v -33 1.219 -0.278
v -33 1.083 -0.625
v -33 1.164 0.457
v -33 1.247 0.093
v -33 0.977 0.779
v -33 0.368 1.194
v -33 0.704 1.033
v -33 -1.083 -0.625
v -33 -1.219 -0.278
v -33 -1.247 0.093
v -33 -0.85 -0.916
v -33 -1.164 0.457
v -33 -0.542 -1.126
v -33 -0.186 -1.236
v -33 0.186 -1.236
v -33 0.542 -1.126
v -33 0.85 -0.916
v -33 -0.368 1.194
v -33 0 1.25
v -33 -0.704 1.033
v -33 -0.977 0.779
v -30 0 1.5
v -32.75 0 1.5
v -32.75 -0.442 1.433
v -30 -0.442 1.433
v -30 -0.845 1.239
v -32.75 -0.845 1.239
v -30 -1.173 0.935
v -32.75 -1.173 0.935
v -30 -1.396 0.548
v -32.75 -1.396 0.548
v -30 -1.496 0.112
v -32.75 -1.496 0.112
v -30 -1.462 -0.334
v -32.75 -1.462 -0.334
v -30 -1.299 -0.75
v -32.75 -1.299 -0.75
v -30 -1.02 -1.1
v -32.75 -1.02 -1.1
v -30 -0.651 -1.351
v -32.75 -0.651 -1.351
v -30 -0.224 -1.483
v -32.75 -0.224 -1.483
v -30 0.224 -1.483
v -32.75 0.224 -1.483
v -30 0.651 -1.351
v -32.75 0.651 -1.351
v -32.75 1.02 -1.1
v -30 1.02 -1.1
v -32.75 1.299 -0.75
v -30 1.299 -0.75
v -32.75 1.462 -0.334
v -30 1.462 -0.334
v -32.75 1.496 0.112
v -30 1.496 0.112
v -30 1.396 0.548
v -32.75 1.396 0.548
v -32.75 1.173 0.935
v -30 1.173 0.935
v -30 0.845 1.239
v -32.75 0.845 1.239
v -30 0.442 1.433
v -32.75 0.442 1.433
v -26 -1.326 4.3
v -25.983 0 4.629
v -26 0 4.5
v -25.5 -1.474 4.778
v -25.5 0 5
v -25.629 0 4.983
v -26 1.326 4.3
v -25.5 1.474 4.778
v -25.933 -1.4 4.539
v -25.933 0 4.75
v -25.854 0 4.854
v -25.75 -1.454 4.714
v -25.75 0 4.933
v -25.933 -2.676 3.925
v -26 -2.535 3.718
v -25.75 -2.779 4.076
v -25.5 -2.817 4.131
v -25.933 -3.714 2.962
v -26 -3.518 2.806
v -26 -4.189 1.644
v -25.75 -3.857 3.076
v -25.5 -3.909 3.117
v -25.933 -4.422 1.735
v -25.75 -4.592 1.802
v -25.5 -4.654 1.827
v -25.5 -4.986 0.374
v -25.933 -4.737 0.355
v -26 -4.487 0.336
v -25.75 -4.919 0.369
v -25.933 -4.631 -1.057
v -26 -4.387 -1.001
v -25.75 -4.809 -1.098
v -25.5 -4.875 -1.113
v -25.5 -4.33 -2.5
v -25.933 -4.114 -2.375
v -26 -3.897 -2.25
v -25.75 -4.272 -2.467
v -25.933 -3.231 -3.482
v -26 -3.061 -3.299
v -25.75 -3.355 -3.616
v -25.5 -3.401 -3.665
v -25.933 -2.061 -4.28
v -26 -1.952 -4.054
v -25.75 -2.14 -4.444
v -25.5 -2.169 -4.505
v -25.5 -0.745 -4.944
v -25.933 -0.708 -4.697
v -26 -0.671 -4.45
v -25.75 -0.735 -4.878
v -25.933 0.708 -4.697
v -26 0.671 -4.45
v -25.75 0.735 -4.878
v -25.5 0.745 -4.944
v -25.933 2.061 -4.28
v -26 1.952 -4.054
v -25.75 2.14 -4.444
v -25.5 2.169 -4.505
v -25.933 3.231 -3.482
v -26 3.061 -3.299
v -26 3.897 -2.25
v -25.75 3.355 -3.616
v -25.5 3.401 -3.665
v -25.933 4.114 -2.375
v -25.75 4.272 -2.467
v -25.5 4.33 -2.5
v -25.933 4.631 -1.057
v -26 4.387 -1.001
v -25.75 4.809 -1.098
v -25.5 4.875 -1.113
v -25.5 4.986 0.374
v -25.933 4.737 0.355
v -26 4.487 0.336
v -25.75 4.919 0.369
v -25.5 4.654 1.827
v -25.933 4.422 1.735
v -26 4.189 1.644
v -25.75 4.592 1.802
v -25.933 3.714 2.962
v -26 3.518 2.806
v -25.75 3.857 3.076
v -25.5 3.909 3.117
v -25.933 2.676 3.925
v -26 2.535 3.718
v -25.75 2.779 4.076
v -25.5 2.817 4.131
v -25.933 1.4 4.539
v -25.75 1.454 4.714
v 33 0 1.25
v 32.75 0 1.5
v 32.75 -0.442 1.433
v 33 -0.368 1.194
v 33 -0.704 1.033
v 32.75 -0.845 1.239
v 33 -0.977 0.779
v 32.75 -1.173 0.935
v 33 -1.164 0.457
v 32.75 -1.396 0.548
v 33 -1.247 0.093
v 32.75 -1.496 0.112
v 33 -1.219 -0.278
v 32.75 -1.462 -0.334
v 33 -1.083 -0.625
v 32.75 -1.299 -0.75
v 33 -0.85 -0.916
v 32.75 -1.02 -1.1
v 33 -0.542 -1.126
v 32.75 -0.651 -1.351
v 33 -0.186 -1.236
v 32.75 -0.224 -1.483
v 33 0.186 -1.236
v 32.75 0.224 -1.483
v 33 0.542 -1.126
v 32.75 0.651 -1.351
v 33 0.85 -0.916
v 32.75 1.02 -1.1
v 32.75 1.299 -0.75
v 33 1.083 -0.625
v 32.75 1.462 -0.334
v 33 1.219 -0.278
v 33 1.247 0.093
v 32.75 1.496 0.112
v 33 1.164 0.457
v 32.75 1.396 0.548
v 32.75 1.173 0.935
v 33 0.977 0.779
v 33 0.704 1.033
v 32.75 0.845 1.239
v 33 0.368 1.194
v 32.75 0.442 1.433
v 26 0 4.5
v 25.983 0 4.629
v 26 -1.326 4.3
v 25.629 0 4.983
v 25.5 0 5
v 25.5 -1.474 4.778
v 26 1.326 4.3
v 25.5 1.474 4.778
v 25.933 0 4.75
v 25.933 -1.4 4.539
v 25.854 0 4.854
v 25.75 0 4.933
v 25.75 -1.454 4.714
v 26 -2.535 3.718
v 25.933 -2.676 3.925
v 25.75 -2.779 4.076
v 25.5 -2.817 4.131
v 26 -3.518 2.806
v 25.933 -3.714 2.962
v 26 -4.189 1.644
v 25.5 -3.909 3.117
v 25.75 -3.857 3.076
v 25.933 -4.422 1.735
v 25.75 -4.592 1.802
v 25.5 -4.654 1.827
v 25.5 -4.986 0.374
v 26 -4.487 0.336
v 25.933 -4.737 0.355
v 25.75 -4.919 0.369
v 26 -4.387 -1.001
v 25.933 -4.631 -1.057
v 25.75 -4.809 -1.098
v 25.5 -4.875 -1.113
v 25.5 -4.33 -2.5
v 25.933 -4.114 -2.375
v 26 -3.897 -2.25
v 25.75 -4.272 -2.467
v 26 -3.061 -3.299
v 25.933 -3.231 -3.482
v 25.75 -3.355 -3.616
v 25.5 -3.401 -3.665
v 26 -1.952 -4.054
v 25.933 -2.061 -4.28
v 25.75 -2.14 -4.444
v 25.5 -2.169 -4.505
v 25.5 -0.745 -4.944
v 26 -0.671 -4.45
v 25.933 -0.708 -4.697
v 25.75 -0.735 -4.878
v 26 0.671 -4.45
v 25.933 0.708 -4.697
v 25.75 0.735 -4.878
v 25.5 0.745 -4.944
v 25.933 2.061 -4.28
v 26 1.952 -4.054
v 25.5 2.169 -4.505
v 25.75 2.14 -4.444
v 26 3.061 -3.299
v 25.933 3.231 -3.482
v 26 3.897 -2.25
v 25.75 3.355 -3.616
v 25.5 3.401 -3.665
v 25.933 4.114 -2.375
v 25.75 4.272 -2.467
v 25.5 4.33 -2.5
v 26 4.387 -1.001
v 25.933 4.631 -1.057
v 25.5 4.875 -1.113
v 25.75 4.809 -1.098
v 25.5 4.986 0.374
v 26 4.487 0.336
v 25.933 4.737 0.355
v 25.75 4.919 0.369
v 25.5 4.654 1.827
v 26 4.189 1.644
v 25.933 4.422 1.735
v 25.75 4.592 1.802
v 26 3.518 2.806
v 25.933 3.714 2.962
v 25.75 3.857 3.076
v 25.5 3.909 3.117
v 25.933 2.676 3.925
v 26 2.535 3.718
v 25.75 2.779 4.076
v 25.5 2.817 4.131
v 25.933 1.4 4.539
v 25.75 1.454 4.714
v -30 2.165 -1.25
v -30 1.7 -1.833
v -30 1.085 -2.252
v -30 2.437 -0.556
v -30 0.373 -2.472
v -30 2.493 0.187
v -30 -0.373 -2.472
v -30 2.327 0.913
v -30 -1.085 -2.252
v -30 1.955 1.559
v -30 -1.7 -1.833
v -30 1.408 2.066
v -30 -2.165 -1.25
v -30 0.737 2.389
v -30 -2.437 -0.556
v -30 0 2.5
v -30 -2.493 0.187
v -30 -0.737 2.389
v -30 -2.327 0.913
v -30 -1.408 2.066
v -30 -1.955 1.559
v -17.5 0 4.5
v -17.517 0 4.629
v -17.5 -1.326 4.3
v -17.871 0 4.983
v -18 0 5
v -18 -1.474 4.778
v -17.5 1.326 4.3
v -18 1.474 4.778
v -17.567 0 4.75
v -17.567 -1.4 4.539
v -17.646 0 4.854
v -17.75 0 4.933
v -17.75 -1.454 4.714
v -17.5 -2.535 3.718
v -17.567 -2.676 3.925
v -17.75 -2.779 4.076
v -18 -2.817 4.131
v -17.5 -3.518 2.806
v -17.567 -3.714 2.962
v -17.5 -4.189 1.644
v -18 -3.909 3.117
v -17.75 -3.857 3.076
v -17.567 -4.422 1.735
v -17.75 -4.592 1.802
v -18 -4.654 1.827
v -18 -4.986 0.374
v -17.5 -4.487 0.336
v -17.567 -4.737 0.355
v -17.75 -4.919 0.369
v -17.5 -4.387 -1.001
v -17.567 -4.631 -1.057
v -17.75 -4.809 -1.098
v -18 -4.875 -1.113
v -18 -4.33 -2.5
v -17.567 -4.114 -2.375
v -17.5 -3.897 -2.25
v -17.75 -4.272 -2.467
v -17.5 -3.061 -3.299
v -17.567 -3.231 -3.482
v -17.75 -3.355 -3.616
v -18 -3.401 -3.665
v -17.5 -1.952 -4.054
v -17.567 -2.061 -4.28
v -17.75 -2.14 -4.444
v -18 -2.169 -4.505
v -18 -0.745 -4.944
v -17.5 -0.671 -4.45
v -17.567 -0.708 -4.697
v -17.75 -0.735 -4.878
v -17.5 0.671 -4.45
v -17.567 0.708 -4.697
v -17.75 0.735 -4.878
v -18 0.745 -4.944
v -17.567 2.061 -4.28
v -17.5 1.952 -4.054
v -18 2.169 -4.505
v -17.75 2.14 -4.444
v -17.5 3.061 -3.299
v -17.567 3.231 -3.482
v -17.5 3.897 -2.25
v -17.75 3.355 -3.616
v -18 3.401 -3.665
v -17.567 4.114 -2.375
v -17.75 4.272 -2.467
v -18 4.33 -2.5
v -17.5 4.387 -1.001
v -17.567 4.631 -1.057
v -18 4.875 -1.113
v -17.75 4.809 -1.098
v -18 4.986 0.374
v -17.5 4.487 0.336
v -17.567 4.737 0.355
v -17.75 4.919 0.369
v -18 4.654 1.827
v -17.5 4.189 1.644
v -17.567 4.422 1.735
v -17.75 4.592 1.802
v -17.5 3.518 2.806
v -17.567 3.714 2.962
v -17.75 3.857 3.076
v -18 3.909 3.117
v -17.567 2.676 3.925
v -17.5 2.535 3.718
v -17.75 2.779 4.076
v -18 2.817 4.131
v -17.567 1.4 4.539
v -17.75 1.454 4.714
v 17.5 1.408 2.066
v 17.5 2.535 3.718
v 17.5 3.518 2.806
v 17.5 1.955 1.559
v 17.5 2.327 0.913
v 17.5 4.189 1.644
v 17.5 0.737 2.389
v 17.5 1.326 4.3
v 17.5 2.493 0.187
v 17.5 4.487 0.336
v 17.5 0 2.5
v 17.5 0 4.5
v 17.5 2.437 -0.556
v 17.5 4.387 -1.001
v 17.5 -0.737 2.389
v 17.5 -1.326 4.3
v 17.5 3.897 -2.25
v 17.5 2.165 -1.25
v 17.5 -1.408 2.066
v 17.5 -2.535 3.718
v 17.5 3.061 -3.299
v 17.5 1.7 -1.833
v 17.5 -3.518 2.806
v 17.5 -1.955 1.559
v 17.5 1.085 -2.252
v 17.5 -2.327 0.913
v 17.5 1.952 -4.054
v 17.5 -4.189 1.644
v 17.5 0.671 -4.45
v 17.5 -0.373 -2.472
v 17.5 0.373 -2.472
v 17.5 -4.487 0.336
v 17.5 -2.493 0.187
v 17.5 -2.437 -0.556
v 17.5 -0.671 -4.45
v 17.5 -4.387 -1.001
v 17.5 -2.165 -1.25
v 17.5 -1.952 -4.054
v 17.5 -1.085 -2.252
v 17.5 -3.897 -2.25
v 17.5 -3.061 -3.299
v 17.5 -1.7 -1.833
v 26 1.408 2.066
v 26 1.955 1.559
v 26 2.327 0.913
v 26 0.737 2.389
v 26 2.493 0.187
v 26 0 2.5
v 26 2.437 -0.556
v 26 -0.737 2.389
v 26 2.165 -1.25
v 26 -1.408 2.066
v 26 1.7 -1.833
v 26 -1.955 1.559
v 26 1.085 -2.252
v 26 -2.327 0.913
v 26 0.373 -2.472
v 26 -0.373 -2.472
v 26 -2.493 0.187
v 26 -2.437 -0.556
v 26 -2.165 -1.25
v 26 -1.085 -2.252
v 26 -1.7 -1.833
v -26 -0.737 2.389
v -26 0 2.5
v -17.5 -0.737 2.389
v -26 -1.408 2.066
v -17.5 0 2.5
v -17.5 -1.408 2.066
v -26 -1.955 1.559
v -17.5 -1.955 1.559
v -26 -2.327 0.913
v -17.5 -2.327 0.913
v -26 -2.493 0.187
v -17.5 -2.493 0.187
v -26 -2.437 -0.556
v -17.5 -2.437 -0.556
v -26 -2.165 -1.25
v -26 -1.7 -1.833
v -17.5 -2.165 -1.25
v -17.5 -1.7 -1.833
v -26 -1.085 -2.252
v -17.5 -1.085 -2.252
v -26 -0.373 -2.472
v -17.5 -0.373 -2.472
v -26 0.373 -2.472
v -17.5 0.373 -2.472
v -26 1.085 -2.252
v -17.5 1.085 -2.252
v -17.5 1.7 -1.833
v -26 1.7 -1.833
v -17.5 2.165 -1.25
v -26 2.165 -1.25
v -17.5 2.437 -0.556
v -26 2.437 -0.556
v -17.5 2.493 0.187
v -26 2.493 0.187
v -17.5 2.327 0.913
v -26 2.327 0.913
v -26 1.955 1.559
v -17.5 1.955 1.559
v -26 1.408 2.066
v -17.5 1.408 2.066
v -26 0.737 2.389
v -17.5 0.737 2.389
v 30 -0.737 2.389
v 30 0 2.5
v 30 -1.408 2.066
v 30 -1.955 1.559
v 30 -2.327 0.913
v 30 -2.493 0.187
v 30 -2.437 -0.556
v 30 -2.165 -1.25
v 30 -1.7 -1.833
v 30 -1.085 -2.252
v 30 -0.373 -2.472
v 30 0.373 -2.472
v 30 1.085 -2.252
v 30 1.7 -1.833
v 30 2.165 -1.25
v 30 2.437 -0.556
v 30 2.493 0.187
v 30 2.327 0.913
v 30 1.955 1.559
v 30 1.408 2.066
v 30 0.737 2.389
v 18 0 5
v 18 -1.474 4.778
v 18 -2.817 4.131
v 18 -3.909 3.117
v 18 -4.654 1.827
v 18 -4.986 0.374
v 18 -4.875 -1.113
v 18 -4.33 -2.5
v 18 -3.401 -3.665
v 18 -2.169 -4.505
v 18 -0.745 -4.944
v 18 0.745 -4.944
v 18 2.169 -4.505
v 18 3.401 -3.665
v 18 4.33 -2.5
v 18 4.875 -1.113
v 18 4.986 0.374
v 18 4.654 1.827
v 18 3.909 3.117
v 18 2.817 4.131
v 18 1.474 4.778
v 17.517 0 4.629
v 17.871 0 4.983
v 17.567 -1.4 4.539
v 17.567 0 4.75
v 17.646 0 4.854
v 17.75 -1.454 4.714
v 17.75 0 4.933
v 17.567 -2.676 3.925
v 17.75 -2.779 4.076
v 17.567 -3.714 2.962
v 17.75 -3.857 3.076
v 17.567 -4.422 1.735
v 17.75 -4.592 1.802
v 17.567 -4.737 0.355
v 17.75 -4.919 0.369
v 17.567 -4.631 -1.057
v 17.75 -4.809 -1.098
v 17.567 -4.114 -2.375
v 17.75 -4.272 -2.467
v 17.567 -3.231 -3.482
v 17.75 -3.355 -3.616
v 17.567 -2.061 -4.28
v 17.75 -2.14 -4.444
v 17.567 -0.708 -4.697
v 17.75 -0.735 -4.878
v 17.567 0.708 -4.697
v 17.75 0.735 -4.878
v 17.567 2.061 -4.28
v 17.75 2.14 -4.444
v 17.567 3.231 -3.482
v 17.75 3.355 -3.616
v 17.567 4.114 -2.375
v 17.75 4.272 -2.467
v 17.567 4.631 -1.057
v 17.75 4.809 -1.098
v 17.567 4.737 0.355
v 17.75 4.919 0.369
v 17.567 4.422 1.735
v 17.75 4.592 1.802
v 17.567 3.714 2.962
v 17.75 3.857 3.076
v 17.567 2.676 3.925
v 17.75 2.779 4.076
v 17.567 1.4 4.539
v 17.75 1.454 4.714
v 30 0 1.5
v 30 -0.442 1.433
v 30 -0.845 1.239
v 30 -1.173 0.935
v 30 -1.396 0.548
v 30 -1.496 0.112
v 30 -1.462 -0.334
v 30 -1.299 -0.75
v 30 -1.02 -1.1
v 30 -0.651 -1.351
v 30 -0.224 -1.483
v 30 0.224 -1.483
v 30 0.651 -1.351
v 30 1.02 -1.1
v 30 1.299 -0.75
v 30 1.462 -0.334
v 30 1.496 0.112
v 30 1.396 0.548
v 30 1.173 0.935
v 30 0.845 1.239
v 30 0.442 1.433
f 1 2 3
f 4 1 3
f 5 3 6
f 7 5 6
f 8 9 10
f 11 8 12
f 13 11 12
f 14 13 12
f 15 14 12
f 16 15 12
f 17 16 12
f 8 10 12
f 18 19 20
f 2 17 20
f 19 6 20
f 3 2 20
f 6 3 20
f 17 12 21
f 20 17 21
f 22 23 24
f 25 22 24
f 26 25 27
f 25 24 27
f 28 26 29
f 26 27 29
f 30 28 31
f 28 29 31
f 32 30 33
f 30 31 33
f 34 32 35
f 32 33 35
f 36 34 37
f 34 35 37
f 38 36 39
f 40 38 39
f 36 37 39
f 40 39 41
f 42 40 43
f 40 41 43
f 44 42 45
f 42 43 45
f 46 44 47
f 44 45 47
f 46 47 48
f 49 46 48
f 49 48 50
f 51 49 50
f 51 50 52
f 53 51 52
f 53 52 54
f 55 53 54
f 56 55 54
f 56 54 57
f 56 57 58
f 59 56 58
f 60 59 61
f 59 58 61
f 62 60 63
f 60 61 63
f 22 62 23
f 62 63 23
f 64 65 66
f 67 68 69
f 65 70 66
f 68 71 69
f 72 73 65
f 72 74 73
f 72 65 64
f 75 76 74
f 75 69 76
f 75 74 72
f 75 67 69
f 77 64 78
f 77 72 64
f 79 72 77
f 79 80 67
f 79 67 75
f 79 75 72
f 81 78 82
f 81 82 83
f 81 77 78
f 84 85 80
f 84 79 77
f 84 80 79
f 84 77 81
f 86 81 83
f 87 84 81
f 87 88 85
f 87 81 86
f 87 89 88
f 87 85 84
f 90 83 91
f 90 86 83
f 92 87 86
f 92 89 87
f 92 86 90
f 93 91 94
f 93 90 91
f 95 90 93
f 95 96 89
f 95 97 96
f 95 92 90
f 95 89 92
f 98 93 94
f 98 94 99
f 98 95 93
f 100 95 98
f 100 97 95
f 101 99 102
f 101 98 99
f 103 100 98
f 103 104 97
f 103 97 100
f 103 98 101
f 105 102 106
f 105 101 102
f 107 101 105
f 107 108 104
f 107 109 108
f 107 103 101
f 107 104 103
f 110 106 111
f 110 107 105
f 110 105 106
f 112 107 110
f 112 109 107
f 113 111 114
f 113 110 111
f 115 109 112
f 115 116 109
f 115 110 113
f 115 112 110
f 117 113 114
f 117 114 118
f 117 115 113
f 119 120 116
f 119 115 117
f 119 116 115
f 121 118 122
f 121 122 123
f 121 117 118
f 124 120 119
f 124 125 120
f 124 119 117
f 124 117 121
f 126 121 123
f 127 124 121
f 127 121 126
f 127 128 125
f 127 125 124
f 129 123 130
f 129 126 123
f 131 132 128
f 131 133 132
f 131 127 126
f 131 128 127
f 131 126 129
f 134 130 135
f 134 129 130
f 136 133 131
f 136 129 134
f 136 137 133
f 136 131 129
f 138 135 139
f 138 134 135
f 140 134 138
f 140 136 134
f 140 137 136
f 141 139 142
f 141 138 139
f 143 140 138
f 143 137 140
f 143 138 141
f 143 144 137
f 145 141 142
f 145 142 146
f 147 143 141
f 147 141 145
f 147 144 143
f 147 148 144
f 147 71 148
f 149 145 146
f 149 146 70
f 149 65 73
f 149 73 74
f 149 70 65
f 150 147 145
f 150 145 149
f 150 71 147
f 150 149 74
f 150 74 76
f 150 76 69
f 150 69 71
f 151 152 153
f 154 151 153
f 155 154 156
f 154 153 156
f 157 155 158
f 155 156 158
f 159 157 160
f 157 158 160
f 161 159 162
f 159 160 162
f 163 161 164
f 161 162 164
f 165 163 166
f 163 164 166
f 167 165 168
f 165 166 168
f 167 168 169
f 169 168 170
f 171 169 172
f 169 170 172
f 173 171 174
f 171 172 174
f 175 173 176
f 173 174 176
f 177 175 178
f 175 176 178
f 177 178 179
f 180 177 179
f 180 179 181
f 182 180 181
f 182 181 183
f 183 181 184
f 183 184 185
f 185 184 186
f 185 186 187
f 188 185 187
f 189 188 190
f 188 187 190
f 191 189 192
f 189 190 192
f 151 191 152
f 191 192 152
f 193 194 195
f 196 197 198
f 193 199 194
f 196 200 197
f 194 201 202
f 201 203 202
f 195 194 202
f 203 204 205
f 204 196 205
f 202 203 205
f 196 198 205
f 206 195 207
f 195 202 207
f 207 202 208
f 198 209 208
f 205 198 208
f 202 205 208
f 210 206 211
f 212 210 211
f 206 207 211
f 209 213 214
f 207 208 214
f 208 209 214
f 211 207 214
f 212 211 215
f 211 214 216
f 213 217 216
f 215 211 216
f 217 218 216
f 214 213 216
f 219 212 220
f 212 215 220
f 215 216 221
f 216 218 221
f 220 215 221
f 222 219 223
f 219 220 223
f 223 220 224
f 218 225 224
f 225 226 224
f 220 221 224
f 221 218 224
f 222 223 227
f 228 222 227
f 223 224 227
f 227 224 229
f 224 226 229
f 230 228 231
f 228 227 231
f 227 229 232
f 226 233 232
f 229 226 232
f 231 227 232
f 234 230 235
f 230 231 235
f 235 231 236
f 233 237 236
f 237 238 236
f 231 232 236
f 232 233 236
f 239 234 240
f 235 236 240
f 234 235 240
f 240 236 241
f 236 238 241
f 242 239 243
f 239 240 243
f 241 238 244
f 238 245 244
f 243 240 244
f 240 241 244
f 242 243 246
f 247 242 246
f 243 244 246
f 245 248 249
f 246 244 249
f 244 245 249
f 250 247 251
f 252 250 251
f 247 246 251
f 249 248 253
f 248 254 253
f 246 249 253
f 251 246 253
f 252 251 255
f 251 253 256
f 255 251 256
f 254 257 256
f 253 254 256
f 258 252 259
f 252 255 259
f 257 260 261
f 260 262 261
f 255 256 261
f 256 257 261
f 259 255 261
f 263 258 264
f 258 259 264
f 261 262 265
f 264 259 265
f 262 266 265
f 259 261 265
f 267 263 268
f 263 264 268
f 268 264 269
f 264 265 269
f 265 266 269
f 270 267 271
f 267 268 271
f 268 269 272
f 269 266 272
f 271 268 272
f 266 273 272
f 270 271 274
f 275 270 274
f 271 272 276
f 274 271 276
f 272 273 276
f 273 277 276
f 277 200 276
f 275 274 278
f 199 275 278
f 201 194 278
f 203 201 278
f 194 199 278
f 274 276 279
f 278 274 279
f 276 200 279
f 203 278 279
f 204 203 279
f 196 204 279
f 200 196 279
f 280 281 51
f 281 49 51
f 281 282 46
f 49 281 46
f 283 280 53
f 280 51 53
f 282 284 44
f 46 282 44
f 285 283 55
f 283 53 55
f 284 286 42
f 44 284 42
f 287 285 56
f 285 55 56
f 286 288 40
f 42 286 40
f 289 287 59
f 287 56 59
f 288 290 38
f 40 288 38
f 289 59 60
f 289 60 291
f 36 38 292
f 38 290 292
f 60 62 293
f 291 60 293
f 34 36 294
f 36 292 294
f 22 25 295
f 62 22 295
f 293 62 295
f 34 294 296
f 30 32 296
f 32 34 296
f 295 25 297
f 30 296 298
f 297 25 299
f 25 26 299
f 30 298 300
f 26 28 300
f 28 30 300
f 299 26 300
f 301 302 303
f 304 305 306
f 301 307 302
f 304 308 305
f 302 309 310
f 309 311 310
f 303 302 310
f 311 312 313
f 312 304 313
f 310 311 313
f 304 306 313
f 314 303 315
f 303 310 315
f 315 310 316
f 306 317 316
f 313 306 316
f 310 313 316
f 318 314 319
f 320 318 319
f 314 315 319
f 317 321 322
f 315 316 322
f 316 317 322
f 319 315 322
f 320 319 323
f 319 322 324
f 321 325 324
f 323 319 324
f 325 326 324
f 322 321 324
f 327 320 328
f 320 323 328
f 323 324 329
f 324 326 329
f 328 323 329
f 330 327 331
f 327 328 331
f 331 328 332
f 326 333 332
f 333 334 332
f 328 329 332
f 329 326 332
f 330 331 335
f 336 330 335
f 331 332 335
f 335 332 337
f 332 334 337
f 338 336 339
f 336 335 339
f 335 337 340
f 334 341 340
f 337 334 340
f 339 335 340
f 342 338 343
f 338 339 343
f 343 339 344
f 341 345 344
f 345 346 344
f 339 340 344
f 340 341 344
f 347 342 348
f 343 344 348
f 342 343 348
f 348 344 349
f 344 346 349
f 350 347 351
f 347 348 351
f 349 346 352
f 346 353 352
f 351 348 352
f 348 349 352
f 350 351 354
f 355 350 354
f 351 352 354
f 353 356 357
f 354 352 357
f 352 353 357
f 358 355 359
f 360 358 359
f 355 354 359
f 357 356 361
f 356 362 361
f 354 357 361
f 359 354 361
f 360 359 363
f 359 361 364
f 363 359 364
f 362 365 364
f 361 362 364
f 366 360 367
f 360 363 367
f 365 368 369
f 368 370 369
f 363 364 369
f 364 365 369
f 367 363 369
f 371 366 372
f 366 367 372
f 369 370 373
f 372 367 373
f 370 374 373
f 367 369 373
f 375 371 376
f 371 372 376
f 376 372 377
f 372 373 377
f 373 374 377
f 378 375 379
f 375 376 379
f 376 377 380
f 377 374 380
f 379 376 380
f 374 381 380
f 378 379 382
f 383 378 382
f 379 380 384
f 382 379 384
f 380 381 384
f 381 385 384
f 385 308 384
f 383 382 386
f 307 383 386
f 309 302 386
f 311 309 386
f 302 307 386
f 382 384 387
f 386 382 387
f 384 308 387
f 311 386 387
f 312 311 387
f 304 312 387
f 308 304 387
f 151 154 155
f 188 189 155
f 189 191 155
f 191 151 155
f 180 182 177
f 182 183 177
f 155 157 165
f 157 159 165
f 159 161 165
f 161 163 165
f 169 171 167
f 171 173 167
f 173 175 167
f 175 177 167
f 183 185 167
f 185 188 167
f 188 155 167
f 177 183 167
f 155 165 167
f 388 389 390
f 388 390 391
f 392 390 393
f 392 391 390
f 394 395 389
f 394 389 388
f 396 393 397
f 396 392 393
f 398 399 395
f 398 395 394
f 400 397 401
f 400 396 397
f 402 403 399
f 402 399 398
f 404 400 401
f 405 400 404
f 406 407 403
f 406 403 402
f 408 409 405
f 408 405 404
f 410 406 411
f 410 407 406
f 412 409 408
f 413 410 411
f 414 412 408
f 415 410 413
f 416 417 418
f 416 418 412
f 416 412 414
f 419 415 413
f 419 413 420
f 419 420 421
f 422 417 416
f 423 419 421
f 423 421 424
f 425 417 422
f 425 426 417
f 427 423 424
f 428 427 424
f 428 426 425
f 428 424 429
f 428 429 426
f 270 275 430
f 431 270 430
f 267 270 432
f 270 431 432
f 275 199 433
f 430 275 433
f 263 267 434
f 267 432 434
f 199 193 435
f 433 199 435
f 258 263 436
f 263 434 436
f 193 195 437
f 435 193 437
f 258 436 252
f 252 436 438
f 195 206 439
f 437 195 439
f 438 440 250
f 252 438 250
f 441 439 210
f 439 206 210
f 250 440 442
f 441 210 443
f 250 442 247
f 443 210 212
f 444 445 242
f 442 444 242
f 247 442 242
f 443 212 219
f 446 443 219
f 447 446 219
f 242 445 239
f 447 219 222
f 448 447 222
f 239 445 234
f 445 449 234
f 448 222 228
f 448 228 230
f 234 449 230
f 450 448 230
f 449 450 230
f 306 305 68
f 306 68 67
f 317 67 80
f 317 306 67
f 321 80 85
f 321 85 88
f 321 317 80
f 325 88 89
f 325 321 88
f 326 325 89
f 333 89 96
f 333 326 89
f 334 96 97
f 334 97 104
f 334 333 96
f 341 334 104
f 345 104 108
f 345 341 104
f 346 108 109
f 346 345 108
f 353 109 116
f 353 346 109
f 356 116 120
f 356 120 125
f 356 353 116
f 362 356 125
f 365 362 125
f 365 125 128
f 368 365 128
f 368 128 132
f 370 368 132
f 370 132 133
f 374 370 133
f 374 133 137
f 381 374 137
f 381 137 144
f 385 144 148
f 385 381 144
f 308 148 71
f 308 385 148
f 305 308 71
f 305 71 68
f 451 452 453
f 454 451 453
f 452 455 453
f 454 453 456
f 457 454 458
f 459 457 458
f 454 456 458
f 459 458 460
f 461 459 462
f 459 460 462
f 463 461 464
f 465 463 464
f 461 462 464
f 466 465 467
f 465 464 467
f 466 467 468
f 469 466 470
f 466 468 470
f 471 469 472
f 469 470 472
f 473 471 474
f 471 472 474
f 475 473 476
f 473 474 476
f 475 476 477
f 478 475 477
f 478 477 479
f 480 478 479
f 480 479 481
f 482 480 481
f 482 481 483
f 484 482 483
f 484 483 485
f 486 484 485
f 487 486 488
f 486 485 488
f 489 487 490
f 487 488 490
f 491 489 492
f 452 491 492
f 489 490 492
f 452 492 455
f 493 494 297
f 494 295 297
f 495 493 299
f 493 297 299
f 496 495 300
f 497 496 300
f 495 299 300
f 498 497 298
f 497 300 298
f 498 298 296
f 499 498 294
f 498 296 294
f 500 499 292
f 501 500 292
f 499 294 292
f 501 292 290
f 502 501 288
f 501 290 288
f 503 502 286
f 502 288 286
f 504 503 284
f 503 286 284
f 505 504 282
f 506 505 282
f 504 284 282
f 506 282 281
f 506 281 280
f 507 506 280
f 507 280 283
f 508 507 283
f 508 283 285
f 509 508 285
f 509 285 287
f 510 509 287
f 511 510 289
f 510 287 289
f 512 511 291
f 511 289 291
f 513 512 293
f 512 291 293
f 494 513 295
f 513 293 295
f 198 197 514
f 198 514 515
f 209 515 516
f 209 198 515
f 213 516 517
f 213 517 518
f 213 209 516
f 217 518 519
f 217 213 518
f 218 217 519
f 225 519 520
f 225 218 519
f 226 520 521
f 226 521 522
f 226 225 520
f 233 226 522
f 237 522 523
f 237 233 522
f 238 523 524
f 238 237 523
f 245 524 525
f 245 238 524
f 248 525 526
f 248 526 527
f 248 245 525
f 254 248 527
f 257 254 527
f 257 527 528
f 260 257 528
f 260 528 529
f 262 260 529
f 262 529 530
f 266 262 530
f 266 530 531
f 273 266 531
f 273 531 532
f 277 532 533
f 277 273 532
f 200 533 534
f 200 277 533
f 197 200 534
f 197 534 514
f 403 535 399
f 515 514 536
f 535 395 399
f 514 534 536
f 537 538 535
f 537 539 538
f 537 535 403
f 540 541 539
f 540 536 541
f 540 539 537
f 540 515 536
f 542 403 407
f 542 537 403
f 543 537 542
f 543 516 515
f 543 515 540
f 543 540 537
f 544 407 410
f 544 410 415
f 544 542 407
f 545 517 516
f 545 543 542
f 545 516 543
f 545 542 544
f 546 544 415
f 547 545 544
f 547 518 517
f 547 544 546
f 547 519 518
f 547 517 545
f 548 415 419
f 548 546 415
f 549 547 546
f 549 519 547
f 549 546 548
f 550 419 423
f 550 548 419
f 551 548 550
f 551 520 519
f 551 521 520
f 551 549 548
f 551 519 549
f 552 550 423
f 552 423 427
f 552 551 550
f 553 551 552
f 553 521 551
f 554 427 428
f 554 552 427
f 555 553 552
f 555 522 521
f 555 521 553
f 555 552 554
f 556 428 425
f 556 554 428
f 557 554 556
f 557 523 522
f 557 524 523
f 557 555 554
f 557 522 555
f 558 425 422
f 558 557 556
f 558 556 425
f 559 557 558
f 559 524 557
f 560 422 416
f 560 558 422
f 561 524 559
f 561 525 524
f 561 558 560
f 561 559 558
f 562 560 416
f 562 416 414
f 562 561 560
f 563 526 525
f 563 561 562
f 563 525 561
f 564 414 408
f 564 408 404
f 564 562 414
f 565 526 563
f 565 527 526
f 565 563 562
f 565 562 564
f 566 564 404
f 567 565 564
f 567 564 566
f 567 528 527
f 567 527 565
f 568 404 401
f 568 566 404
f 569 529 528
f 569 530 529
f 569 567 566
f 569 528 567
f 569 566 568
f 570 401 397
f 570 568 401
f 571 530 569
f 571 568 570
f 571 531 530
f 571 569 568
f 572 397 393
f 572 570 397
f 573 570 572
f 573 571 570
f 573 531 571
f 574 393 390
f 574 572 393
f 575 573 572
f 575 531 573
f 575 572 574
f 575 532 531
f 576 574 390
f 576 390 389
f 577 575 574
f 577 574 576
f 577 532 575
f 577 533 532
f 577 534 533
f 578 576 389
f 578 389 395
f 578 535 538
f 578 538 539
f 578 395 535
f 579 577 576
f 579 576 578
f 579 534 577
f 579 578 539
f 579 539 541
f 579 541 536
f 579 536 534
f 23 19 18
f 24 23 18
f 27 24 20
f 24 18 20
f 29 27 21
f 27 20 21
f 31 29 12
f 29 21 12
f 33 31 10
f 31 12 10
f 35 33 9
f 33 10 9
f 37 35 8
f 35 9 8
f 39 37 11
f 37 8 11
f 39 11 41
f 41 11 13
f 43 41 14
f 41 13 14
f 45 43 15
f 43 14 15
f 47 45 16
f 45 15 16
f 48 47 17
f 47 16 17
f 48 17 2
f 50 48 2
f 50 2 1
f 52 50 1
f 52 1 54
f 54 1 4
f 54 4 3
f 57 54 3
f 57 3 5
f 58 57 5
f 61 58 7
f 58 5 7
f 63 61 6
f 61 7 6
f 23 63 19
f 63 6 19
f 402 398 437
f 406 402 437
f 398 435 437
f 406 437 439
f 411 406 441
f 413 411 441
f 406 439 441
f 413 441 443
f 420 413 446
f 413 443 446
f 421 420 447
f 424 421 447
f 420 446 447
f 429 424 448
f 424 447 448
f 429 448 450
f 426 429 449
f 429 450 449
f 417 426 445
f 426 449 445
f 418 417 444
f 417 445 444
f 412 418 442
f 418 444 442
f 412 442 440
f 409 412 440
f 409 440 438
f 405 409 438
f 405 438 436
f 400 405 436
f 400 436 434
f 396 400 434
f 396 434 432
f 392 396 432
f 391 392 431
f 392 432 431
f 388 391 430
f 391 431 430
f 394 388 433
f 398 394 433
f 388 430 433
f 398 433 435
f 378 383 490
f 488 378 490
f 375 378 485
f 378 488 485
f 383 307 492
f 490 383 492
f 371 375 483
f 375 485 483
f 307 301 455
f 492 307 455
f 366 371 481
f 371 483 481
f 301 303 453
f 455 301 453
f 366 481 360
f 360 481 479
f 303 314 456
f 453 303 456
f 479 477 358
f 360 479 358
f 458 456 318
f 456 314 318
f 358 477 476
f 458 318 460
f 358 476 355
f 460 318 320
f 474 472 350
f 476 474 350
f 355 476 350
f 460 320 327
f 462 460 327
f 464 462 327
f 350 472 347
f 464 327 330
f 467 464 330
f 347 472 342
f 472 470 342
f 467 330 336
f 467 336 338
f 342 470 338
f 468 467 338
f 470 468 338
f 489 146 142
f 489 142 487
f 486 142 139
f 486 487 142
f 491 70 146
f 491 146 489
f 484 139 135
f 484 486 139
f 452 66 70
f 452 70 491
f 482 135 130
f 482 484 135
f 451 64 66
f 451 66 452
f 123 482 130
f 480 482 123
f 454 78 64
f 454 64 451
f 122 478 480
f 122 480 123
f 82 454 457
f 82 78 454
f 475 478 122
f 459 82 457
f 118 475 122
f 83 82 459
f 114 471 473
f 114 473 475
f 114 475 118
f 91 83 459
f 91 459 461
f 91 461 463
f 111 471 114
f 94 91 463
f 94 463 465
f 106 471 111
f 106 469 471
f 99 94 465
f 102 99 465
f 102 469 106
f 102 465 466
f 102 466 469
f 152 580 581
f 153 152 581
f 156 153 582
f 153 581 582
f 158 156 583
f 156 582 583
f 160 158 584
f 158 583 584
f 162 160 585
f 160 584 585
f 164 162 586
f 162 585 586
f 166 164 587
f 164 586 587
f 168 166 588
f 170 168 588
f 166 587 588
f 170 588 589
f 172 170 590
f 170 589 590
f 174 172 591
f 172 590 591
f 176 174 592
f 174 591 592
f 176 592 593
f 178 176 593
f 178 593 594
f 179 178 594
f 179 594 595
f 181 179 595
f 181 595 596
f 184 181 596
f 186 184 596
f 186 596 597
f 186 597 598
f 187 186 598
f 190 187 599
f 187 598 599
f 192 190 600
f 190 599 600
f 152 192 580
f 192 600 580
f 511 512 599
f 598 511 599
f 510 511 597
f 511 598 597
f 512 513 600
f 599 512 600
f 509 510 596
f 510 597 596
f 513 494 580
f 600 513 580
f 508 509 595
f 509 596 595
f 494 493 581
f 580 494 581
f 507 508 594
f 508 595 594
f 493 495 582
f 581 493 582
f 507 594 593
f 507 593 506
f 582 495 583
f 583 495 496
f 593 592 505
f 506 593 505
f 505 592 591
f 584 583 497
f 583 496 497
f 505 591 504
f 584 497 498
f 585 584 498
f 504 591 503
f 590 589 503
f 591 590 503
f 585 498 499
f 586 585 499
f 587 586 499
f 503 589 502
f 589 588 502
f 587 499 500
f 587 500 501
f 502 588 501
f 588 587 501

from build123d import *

# Parameters (mm, degrees)
SKETCH2_W     = 8.5
SKETCH2_H     = 2.5
FILLET1_R     = 0.5
FILLET2_R     = 0.5
CHAMFER1_SIZE = 0.25


with BuildPart() as part:
    # Sketch1 → Revolve1 (revolve)
    with BuildSketch(Plane.XY, mode=Mode.PRIVATE) as revolve1_sk:
        Polygon((33, 0), (33, 1.5), (30, 1.5), (30, 2.5), (-30, 2.5), (-30, 1.5), (-33, 1.5), (-33, 0), align=None)
    revolve(revolve1_sk.sketch.rotate(Axis((-35.808977143, 0, 0), (1, 0, 0)), 90), axis=Axis((-35.808977143, 0, 0), (1, 0, 0)))

    # Chamfer1
    chamfer1_edges = [part.edges().sort_by_distance(p)[0] for p in [
        (-33, 0, -1.5),
        (33, 0, -1.5),
    ]]
    chamfer(chamfer1_edges, length=CHAMFER1_SIZE)


with BuildPart() as body_2:
    # Sketch2 → Revolve2 (revolve)
    with BuildSketch(Plane.XY, mode=Mode.PRIVATE) as revolve2_sk:
        with Locations((-21.75, 3.75)):
            Rectangle(SKETCH2_W, SKETCH2_H)
        with Locations((21.75, 3.75)):
            Rectangle(SKETCH2_W, SKETCH2_H)
    revolve(revolve2_sk.sketch.rotate(Axis((-35.808977143, 0, 0), (1, 0, 0)), 90), axis=Axis((-35.808977143, 0, 0), (1, 0, 0)))

    # Fillet1
    fillet1_edges = [body_2.edges().sort_by_distance(p)[0] for p in [
        (-17.5, 0, -5),
        (-26, 0, -5),
    ]]
    fillet(fillet1_edges, radius=FILLET1_R)

    # Fillet2
    fillet2_edges = [body_2.edges().sort_by_distance(p)[0] for p in [
        (26, 0, -5),
        (17.5, 0, -5),
    ]]
    fillet(fillet2_edges, radius=FILLET2_R)


solid = Compound([part.part, body_2.part])
